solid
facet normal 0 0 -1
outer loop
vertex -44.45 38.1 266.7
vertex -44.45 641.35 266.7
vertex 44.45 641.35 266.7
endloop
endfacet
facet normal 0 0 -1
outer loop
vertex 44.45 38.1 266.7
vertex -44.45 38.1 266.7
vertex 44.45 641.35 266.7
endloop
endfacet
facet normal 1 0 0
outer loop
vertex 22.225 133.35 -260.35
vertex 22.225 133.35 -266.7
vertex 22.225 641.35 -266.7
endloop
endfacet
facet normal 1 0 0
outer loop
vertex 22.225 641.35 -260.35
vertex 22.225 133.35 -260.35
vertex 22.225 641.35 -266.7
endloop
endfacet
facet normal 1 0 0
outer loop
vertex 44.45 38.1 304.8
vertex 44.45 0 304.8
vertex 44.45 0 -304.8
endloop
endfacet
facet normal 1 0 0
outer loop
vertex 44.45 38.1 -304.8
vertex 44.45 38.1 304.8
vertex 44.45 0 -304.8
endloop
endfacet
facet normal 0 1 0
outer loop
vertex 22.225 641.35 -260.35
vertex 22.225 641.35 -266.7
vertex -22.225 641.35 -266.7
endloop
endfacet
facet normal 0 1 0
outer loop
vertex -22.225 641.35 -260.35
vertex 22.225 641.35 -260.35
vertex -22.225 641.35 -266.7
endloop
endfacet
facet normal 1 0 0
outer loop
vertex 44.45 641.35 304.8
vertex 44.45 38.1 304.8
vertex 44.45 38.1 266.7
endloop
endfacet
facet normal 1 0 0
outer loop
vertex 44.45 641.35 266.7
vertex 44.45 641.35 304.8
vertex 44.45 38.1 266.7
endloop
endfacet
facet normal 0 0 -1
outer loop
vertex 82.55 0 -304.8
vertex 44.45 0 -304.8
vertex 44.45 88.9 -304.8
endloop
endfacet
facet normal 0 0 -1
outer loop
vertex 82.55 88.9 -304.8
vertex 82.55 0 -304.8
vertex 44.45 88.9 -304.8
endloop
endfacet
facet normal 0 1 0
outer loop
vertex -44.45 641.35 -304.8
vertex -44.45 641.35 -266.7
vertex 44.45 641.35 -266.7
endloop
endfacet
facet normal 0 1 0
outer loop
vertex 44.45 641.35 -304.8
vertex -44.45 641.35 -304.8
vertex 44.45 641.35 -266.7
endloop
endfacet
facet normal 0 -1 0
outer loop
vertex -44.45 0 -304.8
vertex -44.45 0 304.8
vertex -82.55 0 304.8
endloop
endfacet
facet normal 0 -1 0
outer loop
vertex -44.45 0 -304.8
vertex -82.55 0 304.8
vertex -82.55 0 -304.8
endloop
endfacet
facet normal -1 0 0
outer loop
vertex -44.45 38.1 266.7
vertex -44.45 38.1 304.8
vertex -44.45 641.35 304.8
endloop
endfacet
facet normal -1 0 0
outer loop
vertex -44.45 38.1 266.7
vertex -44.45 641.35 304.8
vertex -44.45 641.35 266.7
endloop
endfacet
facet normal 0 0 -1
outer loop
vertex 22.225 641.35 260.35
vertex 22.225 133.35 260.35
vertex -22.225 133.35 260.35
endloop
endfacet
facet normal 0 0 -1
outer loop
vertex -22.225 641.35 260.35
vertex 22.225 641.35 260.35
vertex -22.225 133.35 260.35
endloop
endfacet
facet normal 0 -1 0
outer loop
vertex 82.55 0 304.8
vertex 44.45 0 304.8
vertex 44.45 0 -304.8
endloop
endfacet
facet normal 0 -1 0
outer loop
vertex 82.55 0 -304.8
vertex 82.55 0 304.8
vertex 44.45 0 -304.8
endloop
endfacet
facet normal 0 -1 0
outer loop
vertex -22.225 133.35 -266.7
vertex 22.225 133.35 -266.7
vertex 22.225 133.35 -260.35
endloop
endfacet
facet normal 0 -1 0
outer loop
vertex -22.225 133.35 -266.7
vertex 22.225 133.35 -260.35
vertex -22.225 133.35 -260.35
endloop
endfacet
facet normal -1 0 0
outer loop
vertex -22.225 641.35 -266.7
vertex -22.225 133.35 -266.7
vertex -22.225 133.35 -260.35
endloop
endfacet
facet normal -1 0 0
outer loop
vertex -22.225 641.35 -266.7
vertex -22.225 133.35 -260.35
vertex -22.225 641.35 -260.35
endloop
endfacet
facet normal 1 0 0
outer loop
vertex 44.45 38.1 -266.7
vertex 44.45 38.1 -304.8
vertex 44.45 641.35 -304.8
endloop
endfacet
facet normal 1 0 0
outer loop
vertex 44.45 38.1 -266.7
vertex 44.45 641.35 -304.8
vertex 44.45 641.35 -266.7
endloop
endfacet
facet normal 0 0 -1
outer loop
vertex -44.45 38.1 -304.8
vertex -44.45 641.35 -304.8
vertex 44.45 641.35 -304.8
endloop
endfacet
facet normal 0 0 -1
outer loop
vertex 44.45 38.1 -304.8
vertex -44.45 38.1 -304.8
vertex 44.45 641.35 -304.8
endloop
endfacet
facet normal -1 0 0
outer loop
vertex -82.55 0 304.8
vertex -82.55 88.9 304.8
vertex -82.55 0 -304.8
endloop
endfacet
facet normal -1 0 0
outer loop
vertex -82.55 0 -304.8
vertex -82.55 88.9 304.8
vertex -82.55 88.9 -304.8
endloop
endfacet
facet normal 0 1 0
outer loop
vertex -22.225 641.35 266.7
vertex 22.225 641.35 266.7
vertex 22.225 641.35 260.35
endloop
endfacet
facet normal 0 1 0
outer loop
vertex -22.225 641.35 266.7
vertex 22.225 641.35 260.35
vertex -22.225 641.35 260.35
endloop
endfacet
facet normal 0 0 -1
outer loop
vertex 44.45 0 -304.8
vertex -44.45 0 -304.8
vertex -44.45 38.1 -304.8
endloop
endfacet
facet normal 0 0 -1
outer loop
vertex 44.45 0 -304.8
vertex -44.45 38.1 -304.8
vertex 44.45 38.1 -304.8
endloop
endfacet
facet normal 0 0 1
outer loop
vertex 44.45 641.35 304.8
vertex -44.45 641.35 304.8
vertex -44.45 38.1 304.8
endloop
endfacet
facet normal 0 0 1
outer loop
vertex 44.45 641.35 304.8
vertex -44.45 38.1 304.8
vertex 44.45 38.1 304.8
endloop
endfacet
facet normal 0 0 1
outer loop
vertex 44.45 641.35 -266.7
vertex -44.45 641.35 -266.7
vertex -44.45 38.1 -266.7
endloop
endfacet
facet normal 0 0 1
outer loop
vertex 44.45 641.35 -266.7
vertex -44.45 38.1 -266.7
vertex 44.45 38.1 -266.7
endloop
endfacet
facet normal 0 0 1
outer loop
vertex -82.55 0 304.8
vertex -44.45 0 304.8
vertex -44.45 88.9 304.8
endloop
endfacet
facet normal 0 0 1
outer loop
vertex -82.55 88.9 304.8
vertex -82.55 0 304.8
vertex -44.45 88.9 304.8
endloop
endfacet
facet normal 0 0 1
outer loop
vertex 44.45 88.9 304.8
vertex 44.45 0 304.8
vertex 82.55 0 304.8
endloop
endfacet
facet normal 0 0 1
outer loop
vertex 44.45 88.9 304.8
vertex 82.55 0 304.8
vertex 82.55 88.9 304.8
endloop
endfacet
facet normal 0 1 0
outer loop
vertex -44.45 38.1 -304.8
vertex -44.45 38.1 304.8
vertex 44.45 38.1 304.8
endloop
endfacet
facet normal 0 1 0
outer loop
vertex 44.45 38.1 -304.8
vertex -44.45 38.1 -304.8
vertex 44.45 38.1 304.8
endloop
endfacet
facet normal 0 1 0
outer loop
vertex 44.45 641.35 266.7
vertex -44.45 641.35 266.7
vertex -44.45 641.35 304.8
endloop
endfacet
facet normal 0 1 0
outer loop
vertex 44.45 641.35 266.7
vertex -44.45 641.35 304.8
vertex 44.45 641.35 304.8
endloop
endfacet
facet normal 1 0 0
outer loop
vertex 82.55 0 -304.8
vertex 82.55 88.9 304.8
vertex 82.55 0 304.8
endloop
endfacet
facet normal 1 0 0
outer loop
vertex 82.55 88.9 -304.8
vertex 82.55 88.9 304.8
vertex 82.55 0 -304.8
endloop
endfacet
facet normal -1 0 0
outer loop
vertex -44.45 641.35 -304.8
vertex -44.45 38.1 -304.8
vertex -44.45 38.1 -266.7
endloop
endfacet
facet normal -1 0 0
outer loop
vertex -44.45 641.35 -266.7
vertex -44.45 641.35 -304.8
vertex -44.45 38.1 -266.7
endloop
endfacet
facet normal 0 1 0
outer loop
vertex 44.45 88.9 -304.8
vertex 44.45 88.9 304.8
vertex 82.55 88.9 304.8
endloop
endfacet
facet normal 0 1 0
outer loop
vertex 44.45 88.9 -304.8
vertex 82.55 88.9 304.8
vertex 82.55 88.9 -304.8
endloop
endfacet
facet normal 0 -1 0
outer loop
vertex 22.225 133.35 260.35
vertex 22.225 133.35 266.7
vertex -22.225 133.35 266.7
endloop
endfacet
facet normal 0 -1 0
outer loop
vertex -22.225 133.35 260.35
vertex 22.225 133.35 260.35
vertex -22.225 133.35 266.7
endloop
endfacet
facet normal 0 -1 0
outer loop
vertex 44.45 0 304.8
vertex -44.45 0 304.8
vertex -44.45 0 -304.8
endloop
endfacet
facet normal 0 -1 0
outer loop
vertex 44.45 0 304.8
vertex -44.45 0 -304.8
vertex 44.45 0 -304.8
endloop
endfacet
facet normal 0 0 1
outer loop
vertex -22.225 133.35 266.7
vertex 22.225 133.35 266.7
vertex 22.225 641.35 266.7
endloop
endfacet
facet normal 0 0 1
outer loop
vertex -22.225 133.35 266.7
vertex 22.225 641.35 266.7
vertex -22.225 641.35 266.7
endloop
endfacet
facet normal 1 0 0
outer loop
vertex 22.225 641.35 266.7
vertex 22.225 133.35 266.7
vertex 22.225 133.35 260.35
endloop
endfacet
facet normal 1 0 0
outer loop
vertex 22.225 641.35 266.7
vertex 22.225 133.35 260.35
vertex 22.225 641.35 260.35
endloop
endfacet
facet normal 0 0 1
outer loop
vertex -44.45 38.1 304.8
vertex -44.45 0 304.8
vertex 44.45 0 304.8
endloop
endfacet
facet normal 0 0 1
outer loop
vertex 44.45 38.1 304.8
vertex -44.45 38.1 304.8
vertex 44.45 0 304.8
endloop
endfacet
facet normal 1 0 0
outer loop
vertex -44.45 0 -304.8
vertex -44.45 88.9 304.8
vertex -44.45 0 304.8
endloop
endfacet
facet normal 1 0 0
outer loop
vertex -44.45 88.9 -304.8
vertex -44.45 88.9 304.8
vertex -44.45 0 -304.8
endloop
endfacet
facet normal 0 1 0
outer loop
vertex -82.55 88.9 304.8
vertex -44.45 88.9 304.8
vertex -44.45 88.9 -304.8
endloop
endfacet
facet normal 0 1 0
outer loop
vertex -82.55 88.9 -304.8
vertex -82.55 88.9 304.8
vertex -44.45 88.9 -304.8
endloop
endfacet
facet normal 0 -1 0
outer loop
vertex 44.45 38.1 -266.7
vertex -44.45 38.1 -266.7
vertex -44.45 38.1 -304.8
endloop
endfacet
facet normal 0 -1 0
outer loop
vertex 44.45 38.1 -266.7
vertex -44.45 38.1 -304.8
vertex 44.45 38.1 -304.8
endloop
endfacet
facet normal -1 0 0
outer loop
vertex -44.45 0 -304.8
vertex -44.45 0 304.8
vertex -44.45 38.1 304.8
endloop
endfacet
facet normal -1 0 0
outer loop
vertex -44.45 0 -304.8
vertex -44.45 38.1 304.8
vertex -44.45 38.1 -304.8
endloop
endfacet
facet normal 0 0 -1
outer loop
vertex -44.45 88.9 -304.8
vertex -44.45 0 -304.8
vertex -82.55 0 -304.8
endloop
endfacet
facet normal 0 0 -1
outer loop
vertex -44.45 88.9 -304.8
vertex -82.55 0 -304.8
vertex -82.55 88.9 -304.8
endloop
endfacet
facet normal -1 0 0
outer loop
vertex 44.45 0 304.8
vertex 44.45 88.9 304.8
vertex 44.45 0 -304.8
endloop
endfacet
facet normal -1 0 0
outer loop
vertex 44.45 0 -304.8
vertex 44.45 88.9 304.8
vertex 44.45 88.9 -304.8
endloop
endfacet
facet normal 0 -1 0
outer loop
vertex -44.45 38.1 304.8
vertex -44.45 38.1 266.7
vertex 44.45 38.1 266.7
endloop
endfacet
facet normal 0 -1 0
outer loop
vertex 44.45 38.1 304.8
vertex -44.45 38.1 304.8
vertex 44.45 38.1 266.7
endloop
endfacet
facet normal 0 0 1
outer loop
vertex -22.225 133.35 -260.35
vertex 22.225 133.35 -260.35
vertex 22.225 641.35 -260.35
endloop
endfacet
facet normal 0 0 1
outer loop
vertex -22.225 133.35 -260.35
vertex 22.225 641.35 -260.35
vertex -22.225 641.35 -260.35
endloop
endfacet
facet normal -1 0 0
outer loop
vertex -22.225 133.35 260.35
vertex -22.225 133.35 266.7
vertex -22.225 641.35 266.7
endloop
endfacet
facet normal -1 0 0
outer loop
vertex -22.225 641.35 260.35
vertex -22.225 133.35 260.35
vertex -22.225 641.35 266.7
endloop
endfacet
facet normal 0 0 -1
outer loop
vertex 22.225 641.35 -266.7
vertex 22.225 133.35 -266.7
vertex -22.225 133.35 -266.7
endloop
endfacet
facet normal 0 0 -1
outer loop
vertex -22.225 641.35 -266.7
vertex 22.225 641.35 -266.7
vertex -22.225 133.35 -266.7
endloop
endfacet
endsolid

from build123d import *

# Parameters (mm, degrees)
SKETCH1_W             = 88.9
SKETCH1_H             = 609.6
BASE_BOARD_DEPTH      = 38.1
SKETCH2_W             = 88.9
SKETCH2_H             = 38.1
VERTICAL_BOARD_DEPTH  = 603.25
SKETCH3_W             = 609.6
SKETCH3_H             = 88.9
LATERAL_SUPPORT_DEPTH = 38.1
SKETCH4_W             = 44.45
SKETCH4_H             = 508
DRAWER_SLIDE_DEPTH    = 6.35


with BuildPart() as part:
    # Sketch1 → Base Board (new body)
    with BuildSketch(Plane(origin=(0, 0, 0), x_dir=(1, 0, 0), z_dir=(0, 1, 0))):
        Rectangle(SKETCH1_W, SKETCH1_H)
    extrude(amount=BASE_BOARD_DEPTH)


with BuildPart() as body_2:
    # Sketch2 → Vertical Board (new body)
    with BuildSketch(Plane(origin=(0, 38.1, 0), x_dir=(1, 0, 0), z_dir=(0, 1, 0))):
        with Locations((0, -285.75)):
            Rectangle(SKETCH2_W, SKETCH2_H)
    extrude(amount=VERTICAL_BOARD_DEPTH)


with BuildPart() as body_3:
    # Vertical Board Mirror: mirrored copy
    add(body_2.part.mirror(Plane.XY))


with BuildPart() as body_4:
    # Sketch3 → Lateral Support (new body)
    with BuildSketch(Plane(origin=(44.45, 0, 0), x_dir=(0, 0, -1), z_dir=(1, 0, 0))):
        with Locations((0, 44.45)):
            Rectangle(SKETCH3_W, SKETCH3_H)
    extrude(amount=LATERAL_SUPPORT_DEPTH)


with BuildPart() as body_5:
    # Lateral Support Mirror: mirrored copy
    add(body_4.part.mirror(Plane(origin=(0, 0, 0), x_dir=(0, 0, 1), z_dir=(1, 0, 0))))


with BuildPart() as body_6:
    # Sketch4 → Drawer Slide (new body)
    with BuildSketch(Plane(origin=(0, 0, 266.7), x_dir=(-1, 0, 0), z_dir=(0, 0, -1))):
        with Locations((0, 387.35)):
            Rectangle(SKETCH4_W, SKETCH4_H)
    extrude(amount=DRAWER_SLIDE_DEPTH)


with BuildPart() as body_7:
    # Drawer Slide Mirror: mirrored copy
    add(body_6.part.mirror(Plane.XY))


solid = Compound([part.part, body_2.part, body_3.part, body_4.part, body_5.part, body_6.part, body_7.part])
